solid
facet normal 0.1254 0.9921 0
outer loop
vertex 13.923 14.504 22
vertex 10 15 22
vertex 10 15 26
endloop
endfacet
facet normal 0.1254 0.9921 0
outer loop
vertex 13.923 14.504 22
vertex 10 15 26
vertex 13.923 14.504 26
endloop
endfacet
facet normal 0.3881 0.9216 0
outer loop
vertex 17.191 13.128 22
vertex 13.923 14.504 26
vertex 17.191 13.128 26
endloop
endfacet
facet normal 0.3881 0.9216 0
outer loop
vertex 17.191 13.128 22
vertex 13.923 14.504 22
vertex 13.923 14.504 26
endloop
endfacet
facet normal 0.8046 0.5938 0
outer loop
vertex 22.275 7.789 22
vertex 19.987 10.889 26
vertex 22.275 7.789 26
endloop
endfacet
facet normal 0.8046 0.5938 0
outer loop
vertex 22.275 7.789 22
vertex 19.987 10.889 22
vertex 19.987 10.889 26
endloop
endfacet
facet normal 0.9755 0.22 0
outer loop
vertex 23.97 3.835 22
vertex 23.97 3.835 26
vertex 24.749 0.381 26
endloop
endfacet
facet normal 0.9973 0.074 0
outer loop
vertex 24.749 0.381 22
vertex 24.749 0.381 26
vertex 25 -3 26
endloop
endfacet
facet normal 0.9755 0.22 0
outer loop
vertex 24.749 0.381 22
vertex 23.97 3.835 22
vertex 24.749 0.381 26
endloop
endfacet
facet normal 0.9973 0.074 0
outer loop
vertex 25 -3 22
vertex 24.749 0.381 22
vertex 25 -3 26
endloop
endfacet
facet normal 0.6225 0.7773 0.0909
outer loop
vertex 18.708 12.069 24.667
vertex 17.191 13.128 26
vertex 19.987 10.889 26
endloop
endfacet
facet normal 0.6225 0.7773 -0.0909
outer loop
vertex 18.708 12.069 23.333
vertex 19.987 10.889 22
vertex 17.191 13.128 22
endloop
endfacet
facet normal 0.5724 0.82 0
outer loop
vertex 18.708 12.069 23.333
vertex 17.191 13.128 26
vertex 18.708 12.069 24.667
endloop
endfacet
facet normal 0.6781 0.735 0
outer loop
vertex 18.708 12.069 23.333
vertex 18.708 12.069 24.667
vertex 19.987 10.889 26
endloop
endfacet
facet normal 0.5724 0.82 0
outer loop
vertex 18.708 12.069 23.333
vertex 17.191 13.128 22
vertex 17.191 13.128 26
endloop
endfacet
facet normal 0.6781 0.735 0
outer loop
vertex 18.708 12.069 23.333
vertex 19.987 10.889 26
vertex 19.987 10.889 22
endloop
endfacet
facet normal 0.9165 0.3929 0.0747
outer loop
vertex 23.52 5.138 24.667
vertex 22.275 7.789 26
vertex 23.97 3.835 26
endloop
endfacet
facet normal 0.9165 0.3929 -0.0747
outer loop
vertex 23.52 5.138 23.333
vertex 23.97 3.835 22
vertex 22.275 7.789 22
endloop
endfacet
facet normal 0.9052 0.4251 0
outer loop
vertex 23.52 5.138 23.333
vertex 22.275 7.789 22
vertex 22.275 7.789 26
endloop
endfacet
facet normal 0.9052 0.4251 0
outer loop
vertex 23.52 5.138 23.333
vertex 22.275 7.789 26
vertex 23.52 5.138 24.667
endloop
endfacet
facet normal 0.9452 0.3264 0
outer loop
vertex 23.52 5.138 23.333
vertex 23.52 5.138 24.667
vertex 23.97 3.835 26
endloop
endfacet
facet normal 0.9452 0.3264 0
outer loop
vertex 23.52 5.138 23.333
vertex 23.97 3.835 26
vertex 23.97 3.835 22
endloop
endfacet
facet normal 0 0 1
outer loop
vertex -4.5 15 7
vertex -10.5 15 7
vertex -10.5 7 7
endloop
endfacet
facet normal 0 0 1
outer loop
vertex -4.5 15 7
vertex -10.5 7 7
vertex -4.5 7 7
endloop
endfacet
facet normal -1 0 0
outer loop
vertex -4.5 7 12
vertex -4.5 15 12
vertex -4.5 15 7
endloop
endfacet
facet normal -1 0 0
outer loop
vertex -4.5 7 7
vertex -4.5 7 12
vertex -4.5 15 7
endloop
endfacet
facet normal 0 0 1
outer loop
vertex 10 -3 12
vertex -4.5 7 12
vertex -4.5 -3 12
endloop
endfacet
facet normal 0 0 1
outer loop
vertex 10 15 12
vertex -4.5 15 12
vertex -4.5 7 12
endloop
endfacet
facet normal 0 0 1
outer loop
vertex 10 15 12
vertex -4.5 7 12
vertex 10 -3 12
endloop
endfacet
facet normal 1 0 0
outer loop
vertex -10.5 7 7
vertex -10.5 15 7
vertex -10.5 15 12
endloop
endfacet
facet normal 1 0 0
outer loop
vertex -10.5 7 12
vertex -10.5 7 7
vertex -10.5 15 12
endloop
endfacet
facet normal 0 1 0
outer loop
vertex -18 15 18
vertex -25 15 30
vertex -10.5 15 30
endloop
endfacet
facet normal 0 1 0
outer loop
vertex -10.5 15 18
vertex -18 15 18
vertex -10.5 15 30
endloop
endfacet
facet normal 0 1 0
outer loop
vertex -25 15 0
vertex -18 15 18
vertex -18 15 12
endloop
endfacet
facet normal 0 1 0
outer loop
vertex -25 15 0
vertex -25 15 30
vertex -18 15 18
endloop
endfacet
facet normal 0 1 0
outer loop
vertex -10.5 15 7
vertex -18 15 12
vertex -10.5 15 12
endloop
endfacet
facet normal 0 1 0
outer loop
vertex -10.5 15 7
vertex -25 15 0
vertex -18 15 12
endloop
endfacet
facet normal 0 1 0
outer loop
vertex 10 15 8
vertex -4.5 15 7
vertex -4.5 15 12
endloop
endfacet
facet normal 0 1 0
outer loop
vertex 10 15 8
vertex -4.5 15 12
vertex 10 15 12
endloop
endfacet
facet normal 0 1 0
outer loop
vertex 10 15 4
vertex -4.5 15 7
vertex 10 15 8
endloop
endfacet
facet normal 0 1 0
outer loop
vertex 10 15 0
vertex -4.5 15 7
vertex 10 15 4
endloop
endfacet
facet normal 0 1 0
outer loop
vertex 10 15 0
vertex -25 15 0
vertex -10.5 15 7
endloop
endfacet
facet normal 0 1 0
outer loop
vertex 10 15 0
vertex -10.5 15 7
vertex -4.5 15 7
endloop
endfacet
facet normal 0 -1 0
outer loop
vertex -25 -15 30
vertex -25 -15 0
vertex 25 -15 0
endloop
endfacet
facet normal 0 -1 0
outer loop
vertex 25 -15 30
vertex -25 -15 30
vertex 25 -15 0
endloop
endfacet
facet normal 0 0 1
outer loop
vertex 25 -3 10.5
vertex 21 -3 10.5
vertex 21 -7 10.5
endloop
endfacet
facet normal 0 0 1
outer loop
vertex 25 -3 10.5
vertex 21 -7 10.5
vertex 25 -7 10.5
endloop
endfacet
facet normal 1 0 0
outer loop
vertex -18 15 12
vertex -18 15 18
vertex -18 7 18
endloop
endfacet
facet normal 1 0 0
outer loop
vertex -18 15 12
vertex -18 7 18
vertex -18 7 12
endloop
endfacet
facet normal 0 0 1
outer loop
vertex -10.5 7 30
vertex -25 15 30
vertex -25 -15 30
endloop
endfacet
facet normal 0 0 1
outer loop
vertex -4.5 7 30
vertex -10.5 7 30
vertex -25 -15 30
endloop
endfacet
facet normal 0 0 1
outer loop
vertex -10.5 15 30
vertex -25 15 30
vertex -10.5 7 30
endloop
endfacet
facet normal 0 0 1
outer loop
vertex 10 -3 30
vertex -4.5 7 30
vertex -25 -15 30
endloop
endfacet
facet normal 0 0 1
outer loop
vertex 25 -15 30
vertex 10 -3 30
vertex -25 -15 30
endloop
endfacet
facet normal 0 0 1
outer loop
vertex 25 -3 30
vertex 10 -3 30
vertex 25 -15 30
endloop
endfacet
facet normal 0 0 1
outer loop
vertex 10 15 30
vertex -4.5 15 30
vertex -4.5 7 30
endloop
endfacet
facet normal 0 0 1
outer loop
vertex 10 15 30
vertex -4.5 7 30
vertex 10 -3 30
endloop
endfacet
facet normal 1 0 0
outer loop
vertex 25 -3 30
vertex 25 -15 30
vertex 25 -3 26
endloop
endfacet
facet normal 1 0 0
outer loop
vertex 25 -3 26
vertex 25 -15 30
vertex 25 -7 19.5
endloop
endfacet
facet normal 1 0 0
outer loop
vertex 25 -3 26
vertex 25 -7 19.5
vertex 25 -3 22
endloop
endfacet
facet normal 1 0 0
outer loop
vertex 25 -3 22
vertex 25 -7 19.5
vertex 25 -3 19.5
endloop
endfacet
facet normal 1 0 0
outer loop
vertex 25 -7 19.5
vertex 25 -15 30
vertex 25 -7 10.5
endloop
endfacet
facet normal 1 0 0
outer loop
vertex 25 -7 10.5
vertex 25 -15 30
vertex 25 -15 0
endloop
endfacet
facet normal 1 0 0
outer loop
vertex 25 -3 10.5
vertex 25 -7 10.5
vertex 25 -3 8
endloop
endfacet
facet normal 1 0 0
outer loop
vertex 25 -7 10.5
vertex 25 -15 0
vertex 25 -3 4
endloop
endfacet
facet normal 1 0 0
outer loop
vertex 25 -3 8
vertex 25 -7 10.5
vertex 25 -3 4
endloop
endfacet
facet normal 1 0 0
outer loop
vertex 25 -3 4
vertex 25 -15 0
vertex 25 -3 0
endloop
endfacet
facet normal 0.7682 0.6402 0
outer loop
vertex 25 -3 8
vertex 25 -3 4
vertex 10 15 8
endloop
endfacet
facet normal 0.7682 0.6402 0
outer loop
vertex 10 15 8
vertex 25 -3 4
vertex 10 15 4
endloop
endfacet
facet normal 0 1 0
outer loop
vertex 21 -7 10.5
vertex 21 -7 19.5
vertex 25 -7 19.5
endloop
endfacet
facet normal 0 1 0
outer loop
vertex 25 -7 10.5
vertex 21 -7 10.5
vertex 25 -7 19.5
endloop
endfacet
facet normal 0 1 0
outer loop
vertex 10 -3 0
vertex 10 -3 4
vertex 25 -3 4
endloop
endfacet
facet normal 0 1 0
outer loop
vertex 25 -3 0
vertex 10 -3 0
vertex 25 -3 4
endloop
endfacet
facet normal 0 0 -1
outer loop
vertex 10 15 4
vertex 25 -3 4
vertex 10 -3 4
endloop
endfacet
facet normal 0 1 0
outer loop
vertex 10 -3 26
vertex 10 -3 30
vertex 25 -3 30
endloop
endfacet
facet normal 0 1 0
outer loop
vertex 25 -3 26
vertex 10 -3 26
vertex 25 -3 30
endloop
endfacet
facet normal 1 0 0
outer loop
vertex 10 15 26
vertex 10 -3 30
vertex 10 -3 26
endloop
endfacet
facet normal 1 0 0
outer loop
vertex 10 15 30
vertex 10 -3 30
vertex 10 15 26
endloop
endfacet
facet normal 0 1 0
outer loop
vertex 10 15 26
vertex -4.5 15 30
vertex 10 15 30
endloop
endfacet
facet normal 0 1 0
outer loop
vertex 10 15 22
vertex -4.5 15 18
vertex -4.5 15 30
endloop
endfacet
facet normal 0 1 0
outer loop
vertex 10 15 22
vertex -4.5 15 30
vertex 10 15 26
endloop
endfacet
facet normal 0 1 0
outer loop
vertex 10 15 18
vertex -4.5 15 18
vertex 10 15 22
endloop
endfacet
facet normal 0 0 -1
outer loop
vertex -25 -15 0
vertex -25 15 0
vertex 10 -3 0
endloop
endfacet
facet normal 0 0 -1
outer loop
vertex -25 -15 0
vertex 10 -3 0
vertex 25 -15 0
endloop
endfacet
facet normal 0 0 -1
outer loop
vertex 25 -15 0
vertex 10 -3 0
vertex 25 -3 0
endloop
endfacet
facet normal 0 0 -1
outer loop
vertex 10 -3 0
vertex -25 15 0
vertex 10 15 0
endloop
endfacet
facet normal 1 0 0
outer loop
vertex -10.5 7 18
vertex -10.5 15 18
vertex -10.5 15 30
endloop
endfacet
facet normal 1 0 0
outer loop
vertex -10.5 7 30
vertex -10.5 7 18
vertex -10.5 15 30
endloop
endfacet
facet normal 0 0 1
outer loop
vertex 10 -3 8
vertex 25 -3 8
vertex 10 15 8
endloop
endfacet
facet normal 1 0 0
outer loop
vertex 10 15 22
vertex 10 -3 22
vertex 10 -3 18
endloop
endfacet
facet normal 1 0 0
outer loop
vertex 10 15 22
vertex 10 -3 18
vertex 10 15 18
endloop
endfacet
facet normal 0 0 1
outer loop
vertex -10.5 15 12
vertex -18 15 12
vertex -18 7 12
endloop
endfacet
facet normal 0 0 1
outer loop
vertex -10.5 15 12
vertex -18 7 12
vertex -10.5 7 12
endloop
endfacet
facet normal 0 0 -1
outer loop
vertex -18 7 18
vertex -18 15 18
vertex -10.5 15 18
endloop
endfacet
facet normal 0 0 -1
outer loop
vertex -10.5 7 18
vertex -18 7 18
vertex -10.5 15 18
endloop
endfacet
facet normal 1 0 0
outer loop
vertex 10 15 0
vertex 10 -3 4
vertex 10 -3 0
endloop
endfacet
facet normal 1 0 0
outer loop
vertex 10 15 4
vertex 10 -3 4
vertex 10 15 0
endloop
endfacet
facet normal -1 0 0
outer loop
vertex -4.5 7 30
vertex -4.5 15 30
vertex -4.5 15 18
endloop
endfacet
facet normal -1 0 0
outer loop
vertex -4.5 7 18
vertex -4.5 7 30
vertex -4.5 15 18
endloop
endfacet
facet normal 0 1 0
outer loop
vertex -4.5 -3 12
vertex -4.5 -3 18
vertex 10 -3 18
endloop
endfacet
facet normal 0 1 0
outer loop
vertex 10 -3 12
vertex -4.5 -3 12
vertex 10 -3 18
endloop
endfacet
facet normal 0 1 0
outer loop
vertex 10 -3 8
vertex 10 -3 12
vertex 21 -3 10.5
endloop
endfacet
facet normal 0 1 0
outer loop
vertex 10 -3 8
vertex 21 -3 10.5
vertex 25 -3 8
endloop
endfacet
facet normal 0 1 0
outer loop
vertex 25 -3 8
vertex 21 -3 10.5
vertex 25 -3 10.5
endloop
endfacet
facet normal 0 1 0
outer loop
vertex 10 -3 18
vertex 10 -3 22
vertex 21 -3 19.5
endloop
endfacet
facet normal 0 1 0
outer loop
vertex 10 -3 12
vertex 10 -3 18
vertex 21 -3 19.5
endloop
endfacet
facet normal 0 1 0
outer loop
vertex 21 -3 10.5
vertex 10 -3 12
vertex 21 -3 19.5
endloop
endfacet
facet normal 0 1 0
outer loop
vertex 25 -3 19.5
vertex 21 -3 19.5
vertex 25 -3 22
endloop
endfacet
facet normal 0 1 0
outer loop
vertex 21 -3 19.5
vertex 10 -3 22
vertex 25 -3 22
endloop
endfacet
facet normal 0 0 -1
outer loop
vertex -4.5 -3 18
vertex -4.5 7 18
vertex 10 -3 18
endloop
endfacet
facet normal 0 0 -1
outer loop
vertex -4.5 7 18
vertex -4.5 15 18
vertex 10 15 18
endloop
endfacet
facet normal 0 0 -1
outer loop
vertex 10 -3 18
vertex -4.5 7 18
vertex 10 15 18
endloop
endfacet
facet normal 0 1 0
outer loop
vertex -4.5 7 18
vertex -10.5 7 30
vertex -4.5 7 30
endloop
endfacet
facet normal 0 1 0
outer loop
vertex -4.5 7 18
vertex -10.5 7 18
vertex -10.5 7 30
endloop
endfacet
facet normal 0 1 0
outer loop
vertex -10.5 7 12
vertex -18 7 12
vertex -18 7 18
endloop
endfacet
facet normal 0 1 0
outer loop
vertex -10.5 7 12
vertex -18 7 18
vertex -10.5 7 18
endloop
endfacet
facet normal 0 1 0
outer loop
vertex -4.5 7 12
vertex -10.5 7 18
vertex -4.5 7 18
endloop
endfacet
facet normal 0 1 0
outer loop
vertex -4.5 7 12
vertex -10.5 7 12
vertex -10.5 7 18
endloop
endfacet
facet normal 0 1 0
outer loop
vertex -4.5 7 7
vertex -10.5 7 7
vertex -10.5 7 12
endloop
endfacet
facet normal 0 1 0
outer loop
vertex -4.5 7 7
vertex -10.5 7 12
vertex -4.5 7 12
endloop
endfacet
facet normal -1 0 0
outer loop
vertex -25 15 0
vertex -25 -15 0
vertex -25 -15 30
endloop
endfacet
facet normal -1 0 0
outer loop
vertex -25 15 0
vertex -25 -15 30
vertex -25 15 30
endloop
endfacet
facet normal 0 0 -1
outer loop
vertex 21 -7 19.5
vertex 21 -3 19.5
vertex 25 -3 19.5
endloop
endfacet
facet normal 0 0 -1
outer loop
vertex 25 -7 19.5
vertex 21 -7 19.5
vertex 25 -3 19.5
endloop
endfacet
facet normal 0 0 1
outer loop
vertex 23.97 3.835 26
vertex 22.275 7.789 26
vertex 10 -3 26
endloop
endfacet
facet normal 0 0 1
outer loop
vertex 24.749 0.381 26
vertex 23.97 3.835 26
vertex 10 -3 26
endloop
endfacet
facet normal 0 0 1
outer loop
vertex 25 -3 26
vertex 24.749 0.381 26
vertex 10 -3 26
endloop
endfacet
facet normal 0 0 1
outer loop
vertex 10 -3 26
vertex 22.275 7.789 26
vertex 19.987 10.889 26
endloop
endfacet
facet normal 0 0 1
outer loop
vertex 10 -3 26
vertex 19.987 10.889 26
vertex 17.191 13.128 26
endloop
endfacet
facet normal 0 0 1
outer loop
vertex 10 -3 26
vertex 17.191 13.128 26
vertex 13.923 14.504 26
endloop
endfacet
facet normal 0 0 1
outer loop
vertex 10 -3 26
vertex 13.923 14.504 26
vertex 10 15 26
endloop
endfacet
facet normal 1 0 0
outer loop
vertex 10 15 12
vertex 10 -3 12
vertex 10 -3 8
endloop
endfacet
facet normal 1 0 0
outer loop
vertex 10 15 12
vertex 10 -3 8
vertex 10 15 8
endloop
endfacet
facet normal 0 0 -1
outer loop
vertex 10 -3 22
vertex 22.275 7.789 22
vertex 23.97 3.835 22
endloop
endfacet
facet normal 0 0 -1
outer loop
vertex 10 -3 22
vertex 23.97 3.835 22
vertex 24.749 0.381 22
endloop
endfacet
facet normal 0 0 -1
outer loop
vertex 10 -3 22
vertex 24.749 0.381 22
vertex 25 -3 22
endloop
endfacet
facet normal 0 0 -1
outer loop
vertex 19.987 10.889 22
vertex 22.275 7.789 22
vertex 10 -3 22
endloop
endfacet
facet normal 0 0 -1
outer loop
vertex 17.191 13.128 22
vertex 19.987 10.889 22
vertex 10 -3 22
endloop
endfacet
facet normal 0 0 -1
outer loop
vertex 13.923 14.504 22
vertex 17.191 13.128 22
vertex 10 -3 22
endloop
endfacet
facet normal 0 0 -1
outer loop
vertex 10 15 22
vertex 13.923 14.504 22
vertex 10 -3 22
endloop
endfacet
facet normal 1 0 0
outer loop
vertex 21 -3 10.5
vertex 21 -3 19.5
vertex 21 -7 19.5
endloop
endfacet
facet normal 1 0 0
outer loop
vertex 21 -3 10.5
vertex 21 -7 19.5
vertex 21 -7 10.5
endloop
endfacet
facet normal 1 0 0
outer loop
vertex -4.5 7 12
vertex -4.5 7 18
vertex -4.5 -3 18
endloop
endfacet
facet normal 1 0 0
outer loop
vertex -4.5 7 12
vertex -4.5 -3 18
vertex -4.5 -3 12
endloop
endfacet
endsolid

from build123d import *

# Parameters (mm, degrees)
SKETCH_1_W          = 50
SKETCH_1_H          = 30
EXTRUDE_1_DEPTH     = 30
SKETCH_2_W          = 15
SKETCH_2_H          = 18
CUT_EXTRUDE_1_DEPTH = 42.833001327
SKETCH_3_W          = 14.5
SKETCH_3_H          = 6
CUT_EXTRUDE_2_DEPTH = 18
SKETCH_3_3_W        = 6
SKETCH_3_3_H        = 12
SKETCH_3_3_H_2      = 6
SKETCH_3_3_H_3      = 5
SKETCH_3_3_W_2      = 7.5
CUT_EXTRUDE_3_DEPTH = 8
RIB_START           = -2
RIB_1_DEPTH         = 4
RIB_2_REACH         = 39.762
SKETCH_5_WALL_W     = 100.955579594
SKETCH_5_WALL_H     = 4
SKETCH_6_W          = 4
SKETCH_6_H          = 9
CUT_EXTRUDE_4_DEPTH = 4


# Read off the part's stored shape, not the designer's step: Ребро1
with BuildPart() as part:
    # Эскиз1 → Бобышка-Вытянуть1 (new body)
    with BuildSketch(Plane.XY):
        Rectangle(SKETCH_1_W, SKETCH_1_H)
    extrude(amount=EXTRUDE_1_DEPTH)

    # Эскиз2 → Вырез-Вытянуть1 (cut, through all)
    with BuildSketch(Plane.XY.offset(30)):
        with Locations((17.5, 6)):
            Rectangle(SKETCH_2_W, SKETCH_2_H)
    extrude(amount=-CUT_EXTRUDE_1_DEPTH, mode=Mode.SUBTRACT)

    # Эскиз3 → Вырез-Вытянуть2 (cut)
    with BuildSketch(Plane(origin=(0, 15, 0), x_dir=(1, 0, 0), z_dir=(0, 1, 0))):
        with Locations((2.75, -15)):
            Rectangle(SKETCH_3_W, SKETCH_3_H)
    extrude(amount=-CUT_EXTRUDE_2_DEPTH, mode=Mode.SUBTRACT)

    # Эскиз3<3> → Вырез-Вытянуть3 (cut)
    with BuildSketch(Plane(origin=(0, 15, 0), x_dir=(1, 0, 0), z_dir=(0, 1, 0))):
        with Locations((-7.5, -24)):
            Rectangle(SKETCH_3_3_W, SKETCH_3_3_H)
        with Locations((-7.5, -15)):
            Rectangle(SKETCH_3_3_W, SKETCH_3_3_H_2)
        with Locations((-7.5, -9.5)):
            Rectangle(SKETCH_3_3_W, SKETCH_3_3_H_3)
        with Locations((-14.25, -15)):
            Rectangle(SKETCH_3_3_W_2, SKETCH_3_3_H_2)
    extrude(amount=-CUT_EXTRUDE_3_DEPTH, mode=Mode.SUBTRACT)

    # Ребро1 outline → Ребро1 (add)
    with BuildSketch(Plane.XY.offset(24).offset(RIB_START)):
        with BuildLine():
            add(Edge.make_bspline(
                [(10, 15), (20.842232601, 15), (25, 4.810249676), (25, -3)],
                knots=[0, 0, 0, 0, 1, 1, 1, 1], degree=3))
            Line((10, 15), (10, -3))
            Line((10, -3), (25, -3))
        make_face()
    extrude(amount=RIB_1_DEPTH)

    # Эскиз5 wall → Ребро2 (add, up to next)
    with BuildSketch(Plane(origin=(17.5, 6, 6), x_dir=(-0.640184399664, 0.768221279597, 0), z_dir=(-0.768221279597, -0.640184399664, 0)), mode=Mode.PRIVATE) as rib_2_sk1:
        Rectangle(SKETCH_5_WALL_W, SKETCH_5_WALL_H)
    rib_2_tool1 = extrude(rib_2_sk1.sketch, amount=RIB_2_REACH, mode=Mode.PRIVATE) - part.part
    add(rib_2_tool1.solids().sort_by_distance((17.5, 6, 6))[0])

    # Эскиз6 → Вырез-Вытянуть4 (cut)
    with BuildSketch(Plane(origin=(0, -3, 0), x_dir=(1, 0, 0), z_dir=(0, 1, 0))):
        with Locations((23, -15)):
            Rectangle(SKETCH_6_W, SKETCH_6_H)
    extrude(amount=-CUT_EXTRUDE_4_DEPTH, mode=Mode.SUBTRACT)


solid = part.part
